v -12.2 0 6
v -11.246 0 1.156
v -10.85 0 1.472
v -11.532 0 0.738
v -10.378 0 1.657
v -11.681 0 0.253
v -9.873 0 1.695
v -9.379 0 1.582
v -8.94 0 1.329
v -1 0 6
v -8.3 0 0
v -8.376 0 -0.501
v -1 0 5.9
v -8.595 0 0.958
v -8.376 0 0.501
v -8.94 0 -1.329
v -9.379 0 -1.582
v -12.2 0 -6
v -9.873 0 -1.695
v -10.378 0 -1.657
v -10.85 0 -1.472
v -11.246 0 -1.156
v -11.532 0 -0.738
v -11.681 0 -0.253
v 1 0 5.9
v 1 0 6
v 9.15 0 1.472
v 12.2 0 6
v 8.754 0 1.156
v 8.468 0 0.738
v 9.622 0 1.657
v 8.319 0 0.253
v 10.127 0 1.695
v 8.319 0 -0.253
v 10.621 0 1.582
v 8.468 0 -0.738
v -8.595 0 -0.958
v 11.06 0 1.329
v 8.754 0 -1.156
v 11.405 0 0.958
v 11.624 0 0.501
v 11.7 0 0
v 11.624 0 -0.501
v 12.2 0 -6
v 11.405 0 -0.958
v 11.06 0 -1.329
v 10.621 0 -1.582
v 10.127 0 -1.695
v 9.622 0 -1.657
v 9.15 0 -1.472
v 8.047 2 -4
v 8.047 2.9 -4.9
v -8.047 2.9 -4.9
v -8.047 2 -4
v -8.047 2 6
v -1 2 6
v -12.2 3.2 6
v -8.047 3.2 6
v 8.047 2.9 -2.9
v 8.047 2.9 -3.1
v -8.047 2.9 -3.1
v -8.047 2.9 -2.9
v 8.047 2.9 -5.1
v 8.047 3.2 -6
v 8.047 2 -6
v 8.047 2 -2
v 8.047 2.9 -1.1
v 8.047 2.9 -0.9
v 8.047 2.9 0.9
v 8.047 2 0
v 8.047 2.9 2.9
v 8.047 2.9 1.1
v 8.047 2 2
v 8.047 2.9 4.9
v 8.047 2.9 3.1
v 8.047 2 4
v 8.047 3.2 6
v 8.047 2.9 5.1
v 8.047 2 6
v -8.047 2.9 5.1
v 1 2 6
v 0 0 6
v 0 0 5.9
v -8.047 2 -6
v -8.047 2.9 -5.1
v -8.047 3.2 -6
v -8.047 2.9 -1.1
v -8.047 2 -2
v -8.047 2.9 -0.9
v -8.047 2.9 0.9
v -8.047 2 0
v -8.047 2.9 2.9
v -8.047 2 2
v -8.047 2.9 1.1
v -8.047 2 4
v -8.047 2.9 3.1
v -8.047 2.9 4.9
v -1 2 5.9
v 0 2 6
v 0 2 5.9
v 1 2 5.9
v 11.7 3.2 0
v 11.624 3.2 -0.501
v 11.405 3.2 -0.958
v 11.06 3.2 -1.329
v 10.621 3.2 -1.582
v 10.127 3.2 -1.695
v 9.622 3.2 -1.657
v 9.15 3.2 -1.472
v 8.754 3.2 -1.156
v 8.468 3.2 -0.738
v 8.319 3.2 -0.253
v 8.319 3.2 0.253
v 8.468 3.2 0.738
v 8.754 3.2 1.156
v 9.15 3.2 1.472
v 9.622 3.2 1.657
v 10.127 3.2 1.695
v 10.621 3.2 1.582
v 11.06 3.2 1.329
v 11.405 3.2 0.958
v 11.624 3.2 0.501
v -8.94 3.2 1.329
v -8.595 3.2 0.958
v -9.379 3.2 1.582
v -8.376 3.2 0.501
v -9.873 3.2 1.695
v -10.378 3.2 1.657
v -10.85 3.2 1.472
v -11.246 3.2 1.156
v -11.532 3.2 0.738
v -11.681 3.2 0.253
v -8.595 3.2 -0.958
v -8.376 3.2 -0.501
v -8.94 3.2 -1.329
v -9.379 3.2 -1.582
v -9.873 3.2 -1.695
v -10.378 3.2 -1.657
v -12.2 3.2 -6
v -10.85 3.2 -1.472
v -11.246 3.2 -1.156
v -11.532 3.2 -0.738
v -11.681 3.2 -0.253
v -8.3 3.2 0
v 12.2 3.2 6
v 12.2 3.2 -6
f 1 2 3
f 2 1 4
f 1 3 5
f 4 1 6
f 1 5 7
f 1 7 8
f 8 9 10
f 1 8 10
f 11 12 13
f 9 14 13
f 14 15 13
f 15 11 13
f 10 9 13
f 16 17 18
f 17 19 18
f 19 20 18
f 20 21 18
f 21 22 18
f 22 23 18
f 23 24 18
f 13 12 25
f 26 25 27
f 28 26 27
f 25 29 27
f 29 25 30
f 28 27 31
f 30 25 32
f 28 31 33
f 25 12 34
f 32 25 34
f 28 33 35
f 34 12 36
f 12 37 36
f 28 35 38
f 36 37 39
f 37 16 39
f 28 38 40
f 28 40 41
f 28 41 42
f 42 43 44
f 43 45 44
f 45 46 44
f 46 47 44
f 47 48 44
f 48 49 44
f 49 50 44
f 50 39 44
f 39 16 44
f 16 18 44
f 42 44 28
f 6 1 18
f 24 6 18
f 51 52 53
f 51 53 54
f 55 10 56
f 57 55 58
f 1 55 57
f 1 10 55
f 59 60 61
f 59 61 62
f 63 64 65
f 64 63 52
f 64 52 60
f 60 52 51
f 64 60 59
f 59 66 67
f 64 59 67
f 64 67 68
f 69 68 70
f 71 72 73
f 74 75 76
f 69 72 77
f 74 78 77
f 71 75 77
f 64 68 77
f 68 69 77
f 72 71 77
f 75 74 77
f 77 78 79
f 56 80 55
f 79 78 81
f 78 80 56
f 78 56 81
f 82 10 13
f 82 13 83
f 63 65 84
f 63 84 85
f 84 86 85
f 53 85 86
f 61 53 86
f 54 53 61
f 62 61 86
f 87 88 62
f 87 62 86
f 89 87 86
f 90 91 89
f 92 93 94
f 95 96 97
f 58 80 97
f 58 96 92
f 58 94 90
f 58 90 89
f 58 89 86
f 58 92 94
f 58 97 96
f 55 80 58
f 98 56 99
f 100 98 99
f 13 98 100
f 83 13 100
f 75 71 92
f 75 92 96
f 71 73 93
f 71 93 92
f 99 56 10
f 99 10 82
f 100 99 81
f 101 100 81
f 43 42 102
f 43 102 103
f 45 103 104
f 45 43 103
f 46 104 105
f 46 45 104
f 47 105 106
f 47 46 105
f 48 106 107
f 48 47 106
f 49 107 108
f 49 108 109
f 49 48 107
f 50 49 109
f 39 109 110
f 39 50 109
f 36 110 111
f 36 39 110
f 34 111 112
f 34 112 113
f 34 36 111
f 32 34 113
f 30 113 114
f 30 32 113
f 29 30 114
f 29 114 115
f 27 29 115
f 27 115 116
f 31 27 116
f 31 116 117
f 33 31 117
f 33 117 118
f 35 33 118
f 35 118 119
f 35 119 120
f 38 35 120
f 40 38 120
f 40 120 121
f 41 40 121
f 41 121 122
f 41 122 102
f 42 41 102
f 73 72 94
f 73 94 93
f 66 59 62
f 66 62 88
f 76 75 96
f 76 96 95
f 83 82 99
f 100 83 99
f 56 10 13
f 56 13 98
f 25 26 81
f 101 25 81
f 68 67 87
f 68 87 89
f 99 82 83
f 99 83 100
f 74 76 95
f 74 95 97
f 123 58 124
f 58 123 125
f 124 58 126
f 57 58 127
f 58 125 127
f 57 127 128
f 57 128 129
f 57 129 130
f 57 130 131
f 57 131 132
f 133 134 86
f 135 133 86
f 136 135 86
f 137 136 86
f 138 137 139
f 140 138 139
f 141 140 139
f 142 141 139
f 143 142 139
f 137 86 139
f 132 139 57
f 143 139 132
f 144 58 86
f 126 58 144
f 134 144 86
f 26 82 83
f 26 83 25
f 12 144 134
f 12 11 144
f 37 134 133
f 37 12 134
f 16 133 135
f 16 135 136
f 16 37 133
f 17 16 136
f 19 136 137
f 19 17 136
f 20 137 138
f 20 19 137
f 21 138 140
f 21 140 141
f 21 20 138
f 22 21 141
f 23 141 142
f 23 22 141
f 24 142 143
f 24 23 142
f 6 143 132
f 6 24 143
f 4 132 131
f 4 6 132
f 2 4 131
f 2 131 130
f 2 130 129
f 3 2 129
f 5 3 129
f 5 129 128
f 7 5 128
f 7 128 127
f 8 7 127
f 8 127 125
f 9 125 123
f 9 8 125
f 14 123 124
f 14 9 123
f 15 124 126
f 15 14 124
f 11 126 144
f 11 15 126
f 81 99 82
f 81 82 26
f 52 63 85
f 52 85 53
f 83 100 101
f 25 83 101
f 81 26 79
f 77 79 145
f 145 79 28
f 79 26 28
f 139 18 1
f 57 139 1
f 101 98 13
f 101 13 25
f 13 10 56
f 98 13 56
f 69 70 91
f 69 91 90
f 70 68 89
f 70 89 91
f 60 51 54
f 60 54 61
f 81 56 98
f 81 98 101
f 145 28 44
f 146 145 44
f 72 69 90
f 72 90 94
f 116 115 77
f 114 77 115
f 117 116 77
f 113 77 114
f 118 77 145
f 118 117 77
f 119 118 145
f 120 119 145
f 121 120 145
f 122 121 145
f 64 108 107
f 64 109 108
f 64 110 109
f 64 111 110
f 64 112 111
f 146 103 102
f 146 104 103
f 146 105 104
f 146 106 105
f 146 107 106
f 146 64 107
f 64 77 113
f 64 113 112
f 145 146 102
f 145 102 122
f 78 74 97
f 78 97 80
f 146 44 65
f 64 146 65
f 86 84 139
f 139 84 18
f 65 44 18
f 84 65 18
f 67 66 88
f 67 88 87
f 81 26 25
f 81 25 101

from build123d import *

# Parameters (mm, degrees)
CROQUIS1_R              = 1.7
SALIENTE_EXTRUIR1_DEPTH = 2
SALIENTE_EXTRUIR2_START = 4.796684
SALIENTE_EXTRUIR2_DEPTH = 16.093368
MATRIZL1_COUNT          = 6
MATRIZL1_PITCH          = 2
SKETCH1_W               = 2
SKETCH1_H               = 2
CUT_EXTRUDE1_DEPTH      = 0.1
SKETCH1_3_W             = 1
SKETCH1_3_H             = 2
BOSS_EXTRUDE1_DEPTH     = 0.1
SKETCH1_4_W             = 1
SKETCH1_4_H             = 2
BOSS_EXTRUDE2_DEPTH     = 0.1
BOSS_EXTRUDE3_START     = 2
CROQUIS1_4_R            = 1.7
BOSS_EXTRUDE3_DEPTH     = 1.2
BOSS_EXTRUDE4_DEPTH     = 3.2


with BuildPart() as part:
    # Croquis1 → Saliente-Extruir1 (new body)
    with BuildSketch(Plane(origin=(0, 0, 0), x_dir=(1, 0, 0), z_dir=(0, 1, 0))):
        Polygon((-8.046684223, -2.46171515), (-8.046684223, 2.46171515), (-8.046684223, 6), (8.046684223, 6), (8.046684223, 2.46171515), (8.046684223, -2.46171515), (8.046684223, -6), (-8.046684223, -6), align=None)
        with BuildLine():
            Line((8.046684223, -2.46171515), (8.046684223, 2.46171515))
            ThreePointArc((8.046684223, 2.46171515), (8.827888747, 2.181898598), (9.657649034, 2.173199442))
            ThreePointArc((9.657649034, 2.173199442), (12.2, 0), (9.657649034, -2.173199442))
            ThreePointArc((9.657649034, -2.173199442), (8.827888747, -2.181898598), (8.046684223, -2.46171515))
        make_face()
        with Locations((10, 0)):
            Circle(CROQUIS1_R, mode=Mode.SUBTRACT)
        with BuildLine():
            ThreePointArc((-9.657649034, -2.173199442), (-12.2, 0), (-9.657649034, 2.173199442))
            ThreePointArc((-9.657649034, 2.173199442), (-8.827888747, 2.181898598), (-8.046684223, 2.46171515))
            Line((-8.046684223, 2.46171515), (-8.046684223, -2.46171515))
            ThreePointArc((-8.046684223, -2.46171515), (-8.827888747, -2.181898598), (-9.657649034, -2.173199442))
        make_face()
        with Locations((-10, 0)):
            Circle(CROQUIS1_R, mode=Mode.SUBTRACT)
    extrude(amount=SALIENTE_EXTRUIR1_DEPTH)

    # Croquis4 → Saliente-Extruir2 (add)
    with BuildSketch(Plane(origin=(3.25, 0, 0), x_dir=(0, 0, -1), z_dir=(1, 0, 0)).offset(SALIENTE_EXTRUIR2_START)):
        Polygon((-6, 2), (-4, 2), (-4.9, 2.9), (-5.1, 2.9), align=None)
    saliente_extruir2 = extrude(amount=-SALIENTE_EXTRUIR2_DEPTH)

    # MatrizL1: Saliente-Extruir2 ×6
    with Locations(*[(0, 0, -i * MATRIZL1_PITCH) for i in range(1, MATRIZL1_COUNT)]):
        add(saliente_extruir2)

    # Sketch1 → Cut-Extrude1 (cut)
    with BuildSketch(Plane.XY.offset(6)):
        with Locations((0, 1)):
            Rectangle(SKETCH1_W, SKETCH1_H)
    extrude(amount=-CUT_EXTRUDE1_DEPTH, mode=Mode.SUBTRACT)

    # Croquis1<4> → Boss-Extrude3 (add)
    with BuildSketch(Plane(origin=(0, 0, 0), x_dir=(1, 0, 0), z_dir=(0, 1, 0)).offset(BOSS_EXTRUDE3_START)):
        with BuildLine():
            ThreePointArc((-9.657649034, -2.173199442), (-12.2, 0), (-9.657649034, 2.173199442))
            ThreePointArc((-9.657649034, 2.173199442), (-8.827888747, 2.181898598), (-8.046684223, 2.46171515))
            Line((-8.046684223, 2.46171515), (-8.046684223, -2.46171515))
            ThreePointArc((-8.046684223, -2.46171515), (-8.827888747, -2.181898598), (-9.657649034, -2.173199442))
        make_face()
        with Locations((-10, 0)):
            Circle(CROQUIS1_4_R, mode=Mode.SUBTRACT)
        with BuildLine():
            Line((8.046684223, -2.46171515), (8.046684223, 2.46171515))
            ThreePointArc((8.046684223, 2.46171515), (8.827888747, 2.181898598), (9.657649034, 2.173199442))
            ThreePointArc((9.657649034, 2.173199442), (12.2, 0), (9.657649034, -2.173199442))
            ThreePointArc((9.657649034, -2.173199442), (8.827888747, -2.181898598), (8.046684223, -2.46171515))
        make_face()
        with Locations((10, 0)):
            Circle(CROQUIS1_4_R, mode=Mode.SUBTRACT)
    extrude(amount=BOSS_EXTRUDE3_DEPTH)

    # Croquis1<6> → Boss-Extrude4 (add)
    with BuildSketch(Plane(origin=(0, 0, 0), x_dir=(1, 0, 0), z_dir=(0, 1, 0))):
        with BuildLine():
            ThreePointArc((9.657649034, -2.173199442), (8.827888747, -2.181898598), (8.046684223, -2.46171515))
            Line((8.046684223, -2.46171515), (8.046684223, -6))
            Line((8.046684223, -6), (12.2, -6))
            Line((12.2, -6), (12.2, 0))
            ThreePointArc((12.2, 0), (11.429480303, -1.672299633), (9.657649034, -2.173199442))
        make_face()
        with BuildLine():
            Line((12.2, 6), (8.046684223, 6))
            Line((8.046684223, 6), (8.046684223, 2.46171515))
            ThreePointArc((8.046684223, 2.46171515), (8.827888747, 2.181898598), (9.657649034, 2.173199442))
            ThreePointArc((9.657649034, 2.173199442), (11.429480303, 1.672299633), (12.2, 0))
            Line((12.2, 0), (12.2, 6))
        make_face()
        with BuildLine():
            Line((-8.046684223, -6), (-8.046684223, -2.46171515))
            ThreePointArc((-8.046684223, -2.46171515), (-8.827888747, -2.181898598), (-9.657649034, -2.173199442))
            ThreePointArc((-9.657649034, -2.173199442), (-11.429480303, -1.672299633), (-12.2, 0))
            Line((-12.2, 0), (-12.2, -6))
            Line((-12.2, -6), (-8.046684223, -6))
        make_face()
        with BuildLine():
            Line((-8.046684223, 2.46171515), (-8.046684223, 6))
            Line((-8.046684223, 6), (-12.2, 6))
            Line((-12.2, 6), (-12.2, 0))
            ThreePointArc((-12.2, 0), (-11.429480303, 1.672299633), (-9.657649034, 2.173199442))
            ThreePointArc((-9.657649034, 2.173199442), (-8.827888747, 2.181898598), (-8.046684223, 2.46171515))
        make_face()
    extrude(amount=BOSS_EXTRUDE4_DEPTH)


with BuildPart() as body_2:
    # Sketch1<3> → Boss-Extrude1 (new body)
    with BuildSketch(Plane.XY.offset(6)):
        with Locations((0.5, 1)):
            Rectangle(SKETCH1_3_W, SKETCH1_3_H)
    extrude(amount=-BOSS_EXTRUDE1_DEPTH)


with BuildPart() as body_3:
    # Sketch1<4> → Boss-Extrude2 (new body)
    with BuildSketch(Plane.XY.offset(6)):
        with Locations((-0.5, 1)):
            Rectangle(SKETCH1_4_W, SKETCH1_4_H)
    extrude(amount=-BOSS_EXTRUDE2_DEPTH)


solid = Compound([part.part, body_2.part, body_3.part])
